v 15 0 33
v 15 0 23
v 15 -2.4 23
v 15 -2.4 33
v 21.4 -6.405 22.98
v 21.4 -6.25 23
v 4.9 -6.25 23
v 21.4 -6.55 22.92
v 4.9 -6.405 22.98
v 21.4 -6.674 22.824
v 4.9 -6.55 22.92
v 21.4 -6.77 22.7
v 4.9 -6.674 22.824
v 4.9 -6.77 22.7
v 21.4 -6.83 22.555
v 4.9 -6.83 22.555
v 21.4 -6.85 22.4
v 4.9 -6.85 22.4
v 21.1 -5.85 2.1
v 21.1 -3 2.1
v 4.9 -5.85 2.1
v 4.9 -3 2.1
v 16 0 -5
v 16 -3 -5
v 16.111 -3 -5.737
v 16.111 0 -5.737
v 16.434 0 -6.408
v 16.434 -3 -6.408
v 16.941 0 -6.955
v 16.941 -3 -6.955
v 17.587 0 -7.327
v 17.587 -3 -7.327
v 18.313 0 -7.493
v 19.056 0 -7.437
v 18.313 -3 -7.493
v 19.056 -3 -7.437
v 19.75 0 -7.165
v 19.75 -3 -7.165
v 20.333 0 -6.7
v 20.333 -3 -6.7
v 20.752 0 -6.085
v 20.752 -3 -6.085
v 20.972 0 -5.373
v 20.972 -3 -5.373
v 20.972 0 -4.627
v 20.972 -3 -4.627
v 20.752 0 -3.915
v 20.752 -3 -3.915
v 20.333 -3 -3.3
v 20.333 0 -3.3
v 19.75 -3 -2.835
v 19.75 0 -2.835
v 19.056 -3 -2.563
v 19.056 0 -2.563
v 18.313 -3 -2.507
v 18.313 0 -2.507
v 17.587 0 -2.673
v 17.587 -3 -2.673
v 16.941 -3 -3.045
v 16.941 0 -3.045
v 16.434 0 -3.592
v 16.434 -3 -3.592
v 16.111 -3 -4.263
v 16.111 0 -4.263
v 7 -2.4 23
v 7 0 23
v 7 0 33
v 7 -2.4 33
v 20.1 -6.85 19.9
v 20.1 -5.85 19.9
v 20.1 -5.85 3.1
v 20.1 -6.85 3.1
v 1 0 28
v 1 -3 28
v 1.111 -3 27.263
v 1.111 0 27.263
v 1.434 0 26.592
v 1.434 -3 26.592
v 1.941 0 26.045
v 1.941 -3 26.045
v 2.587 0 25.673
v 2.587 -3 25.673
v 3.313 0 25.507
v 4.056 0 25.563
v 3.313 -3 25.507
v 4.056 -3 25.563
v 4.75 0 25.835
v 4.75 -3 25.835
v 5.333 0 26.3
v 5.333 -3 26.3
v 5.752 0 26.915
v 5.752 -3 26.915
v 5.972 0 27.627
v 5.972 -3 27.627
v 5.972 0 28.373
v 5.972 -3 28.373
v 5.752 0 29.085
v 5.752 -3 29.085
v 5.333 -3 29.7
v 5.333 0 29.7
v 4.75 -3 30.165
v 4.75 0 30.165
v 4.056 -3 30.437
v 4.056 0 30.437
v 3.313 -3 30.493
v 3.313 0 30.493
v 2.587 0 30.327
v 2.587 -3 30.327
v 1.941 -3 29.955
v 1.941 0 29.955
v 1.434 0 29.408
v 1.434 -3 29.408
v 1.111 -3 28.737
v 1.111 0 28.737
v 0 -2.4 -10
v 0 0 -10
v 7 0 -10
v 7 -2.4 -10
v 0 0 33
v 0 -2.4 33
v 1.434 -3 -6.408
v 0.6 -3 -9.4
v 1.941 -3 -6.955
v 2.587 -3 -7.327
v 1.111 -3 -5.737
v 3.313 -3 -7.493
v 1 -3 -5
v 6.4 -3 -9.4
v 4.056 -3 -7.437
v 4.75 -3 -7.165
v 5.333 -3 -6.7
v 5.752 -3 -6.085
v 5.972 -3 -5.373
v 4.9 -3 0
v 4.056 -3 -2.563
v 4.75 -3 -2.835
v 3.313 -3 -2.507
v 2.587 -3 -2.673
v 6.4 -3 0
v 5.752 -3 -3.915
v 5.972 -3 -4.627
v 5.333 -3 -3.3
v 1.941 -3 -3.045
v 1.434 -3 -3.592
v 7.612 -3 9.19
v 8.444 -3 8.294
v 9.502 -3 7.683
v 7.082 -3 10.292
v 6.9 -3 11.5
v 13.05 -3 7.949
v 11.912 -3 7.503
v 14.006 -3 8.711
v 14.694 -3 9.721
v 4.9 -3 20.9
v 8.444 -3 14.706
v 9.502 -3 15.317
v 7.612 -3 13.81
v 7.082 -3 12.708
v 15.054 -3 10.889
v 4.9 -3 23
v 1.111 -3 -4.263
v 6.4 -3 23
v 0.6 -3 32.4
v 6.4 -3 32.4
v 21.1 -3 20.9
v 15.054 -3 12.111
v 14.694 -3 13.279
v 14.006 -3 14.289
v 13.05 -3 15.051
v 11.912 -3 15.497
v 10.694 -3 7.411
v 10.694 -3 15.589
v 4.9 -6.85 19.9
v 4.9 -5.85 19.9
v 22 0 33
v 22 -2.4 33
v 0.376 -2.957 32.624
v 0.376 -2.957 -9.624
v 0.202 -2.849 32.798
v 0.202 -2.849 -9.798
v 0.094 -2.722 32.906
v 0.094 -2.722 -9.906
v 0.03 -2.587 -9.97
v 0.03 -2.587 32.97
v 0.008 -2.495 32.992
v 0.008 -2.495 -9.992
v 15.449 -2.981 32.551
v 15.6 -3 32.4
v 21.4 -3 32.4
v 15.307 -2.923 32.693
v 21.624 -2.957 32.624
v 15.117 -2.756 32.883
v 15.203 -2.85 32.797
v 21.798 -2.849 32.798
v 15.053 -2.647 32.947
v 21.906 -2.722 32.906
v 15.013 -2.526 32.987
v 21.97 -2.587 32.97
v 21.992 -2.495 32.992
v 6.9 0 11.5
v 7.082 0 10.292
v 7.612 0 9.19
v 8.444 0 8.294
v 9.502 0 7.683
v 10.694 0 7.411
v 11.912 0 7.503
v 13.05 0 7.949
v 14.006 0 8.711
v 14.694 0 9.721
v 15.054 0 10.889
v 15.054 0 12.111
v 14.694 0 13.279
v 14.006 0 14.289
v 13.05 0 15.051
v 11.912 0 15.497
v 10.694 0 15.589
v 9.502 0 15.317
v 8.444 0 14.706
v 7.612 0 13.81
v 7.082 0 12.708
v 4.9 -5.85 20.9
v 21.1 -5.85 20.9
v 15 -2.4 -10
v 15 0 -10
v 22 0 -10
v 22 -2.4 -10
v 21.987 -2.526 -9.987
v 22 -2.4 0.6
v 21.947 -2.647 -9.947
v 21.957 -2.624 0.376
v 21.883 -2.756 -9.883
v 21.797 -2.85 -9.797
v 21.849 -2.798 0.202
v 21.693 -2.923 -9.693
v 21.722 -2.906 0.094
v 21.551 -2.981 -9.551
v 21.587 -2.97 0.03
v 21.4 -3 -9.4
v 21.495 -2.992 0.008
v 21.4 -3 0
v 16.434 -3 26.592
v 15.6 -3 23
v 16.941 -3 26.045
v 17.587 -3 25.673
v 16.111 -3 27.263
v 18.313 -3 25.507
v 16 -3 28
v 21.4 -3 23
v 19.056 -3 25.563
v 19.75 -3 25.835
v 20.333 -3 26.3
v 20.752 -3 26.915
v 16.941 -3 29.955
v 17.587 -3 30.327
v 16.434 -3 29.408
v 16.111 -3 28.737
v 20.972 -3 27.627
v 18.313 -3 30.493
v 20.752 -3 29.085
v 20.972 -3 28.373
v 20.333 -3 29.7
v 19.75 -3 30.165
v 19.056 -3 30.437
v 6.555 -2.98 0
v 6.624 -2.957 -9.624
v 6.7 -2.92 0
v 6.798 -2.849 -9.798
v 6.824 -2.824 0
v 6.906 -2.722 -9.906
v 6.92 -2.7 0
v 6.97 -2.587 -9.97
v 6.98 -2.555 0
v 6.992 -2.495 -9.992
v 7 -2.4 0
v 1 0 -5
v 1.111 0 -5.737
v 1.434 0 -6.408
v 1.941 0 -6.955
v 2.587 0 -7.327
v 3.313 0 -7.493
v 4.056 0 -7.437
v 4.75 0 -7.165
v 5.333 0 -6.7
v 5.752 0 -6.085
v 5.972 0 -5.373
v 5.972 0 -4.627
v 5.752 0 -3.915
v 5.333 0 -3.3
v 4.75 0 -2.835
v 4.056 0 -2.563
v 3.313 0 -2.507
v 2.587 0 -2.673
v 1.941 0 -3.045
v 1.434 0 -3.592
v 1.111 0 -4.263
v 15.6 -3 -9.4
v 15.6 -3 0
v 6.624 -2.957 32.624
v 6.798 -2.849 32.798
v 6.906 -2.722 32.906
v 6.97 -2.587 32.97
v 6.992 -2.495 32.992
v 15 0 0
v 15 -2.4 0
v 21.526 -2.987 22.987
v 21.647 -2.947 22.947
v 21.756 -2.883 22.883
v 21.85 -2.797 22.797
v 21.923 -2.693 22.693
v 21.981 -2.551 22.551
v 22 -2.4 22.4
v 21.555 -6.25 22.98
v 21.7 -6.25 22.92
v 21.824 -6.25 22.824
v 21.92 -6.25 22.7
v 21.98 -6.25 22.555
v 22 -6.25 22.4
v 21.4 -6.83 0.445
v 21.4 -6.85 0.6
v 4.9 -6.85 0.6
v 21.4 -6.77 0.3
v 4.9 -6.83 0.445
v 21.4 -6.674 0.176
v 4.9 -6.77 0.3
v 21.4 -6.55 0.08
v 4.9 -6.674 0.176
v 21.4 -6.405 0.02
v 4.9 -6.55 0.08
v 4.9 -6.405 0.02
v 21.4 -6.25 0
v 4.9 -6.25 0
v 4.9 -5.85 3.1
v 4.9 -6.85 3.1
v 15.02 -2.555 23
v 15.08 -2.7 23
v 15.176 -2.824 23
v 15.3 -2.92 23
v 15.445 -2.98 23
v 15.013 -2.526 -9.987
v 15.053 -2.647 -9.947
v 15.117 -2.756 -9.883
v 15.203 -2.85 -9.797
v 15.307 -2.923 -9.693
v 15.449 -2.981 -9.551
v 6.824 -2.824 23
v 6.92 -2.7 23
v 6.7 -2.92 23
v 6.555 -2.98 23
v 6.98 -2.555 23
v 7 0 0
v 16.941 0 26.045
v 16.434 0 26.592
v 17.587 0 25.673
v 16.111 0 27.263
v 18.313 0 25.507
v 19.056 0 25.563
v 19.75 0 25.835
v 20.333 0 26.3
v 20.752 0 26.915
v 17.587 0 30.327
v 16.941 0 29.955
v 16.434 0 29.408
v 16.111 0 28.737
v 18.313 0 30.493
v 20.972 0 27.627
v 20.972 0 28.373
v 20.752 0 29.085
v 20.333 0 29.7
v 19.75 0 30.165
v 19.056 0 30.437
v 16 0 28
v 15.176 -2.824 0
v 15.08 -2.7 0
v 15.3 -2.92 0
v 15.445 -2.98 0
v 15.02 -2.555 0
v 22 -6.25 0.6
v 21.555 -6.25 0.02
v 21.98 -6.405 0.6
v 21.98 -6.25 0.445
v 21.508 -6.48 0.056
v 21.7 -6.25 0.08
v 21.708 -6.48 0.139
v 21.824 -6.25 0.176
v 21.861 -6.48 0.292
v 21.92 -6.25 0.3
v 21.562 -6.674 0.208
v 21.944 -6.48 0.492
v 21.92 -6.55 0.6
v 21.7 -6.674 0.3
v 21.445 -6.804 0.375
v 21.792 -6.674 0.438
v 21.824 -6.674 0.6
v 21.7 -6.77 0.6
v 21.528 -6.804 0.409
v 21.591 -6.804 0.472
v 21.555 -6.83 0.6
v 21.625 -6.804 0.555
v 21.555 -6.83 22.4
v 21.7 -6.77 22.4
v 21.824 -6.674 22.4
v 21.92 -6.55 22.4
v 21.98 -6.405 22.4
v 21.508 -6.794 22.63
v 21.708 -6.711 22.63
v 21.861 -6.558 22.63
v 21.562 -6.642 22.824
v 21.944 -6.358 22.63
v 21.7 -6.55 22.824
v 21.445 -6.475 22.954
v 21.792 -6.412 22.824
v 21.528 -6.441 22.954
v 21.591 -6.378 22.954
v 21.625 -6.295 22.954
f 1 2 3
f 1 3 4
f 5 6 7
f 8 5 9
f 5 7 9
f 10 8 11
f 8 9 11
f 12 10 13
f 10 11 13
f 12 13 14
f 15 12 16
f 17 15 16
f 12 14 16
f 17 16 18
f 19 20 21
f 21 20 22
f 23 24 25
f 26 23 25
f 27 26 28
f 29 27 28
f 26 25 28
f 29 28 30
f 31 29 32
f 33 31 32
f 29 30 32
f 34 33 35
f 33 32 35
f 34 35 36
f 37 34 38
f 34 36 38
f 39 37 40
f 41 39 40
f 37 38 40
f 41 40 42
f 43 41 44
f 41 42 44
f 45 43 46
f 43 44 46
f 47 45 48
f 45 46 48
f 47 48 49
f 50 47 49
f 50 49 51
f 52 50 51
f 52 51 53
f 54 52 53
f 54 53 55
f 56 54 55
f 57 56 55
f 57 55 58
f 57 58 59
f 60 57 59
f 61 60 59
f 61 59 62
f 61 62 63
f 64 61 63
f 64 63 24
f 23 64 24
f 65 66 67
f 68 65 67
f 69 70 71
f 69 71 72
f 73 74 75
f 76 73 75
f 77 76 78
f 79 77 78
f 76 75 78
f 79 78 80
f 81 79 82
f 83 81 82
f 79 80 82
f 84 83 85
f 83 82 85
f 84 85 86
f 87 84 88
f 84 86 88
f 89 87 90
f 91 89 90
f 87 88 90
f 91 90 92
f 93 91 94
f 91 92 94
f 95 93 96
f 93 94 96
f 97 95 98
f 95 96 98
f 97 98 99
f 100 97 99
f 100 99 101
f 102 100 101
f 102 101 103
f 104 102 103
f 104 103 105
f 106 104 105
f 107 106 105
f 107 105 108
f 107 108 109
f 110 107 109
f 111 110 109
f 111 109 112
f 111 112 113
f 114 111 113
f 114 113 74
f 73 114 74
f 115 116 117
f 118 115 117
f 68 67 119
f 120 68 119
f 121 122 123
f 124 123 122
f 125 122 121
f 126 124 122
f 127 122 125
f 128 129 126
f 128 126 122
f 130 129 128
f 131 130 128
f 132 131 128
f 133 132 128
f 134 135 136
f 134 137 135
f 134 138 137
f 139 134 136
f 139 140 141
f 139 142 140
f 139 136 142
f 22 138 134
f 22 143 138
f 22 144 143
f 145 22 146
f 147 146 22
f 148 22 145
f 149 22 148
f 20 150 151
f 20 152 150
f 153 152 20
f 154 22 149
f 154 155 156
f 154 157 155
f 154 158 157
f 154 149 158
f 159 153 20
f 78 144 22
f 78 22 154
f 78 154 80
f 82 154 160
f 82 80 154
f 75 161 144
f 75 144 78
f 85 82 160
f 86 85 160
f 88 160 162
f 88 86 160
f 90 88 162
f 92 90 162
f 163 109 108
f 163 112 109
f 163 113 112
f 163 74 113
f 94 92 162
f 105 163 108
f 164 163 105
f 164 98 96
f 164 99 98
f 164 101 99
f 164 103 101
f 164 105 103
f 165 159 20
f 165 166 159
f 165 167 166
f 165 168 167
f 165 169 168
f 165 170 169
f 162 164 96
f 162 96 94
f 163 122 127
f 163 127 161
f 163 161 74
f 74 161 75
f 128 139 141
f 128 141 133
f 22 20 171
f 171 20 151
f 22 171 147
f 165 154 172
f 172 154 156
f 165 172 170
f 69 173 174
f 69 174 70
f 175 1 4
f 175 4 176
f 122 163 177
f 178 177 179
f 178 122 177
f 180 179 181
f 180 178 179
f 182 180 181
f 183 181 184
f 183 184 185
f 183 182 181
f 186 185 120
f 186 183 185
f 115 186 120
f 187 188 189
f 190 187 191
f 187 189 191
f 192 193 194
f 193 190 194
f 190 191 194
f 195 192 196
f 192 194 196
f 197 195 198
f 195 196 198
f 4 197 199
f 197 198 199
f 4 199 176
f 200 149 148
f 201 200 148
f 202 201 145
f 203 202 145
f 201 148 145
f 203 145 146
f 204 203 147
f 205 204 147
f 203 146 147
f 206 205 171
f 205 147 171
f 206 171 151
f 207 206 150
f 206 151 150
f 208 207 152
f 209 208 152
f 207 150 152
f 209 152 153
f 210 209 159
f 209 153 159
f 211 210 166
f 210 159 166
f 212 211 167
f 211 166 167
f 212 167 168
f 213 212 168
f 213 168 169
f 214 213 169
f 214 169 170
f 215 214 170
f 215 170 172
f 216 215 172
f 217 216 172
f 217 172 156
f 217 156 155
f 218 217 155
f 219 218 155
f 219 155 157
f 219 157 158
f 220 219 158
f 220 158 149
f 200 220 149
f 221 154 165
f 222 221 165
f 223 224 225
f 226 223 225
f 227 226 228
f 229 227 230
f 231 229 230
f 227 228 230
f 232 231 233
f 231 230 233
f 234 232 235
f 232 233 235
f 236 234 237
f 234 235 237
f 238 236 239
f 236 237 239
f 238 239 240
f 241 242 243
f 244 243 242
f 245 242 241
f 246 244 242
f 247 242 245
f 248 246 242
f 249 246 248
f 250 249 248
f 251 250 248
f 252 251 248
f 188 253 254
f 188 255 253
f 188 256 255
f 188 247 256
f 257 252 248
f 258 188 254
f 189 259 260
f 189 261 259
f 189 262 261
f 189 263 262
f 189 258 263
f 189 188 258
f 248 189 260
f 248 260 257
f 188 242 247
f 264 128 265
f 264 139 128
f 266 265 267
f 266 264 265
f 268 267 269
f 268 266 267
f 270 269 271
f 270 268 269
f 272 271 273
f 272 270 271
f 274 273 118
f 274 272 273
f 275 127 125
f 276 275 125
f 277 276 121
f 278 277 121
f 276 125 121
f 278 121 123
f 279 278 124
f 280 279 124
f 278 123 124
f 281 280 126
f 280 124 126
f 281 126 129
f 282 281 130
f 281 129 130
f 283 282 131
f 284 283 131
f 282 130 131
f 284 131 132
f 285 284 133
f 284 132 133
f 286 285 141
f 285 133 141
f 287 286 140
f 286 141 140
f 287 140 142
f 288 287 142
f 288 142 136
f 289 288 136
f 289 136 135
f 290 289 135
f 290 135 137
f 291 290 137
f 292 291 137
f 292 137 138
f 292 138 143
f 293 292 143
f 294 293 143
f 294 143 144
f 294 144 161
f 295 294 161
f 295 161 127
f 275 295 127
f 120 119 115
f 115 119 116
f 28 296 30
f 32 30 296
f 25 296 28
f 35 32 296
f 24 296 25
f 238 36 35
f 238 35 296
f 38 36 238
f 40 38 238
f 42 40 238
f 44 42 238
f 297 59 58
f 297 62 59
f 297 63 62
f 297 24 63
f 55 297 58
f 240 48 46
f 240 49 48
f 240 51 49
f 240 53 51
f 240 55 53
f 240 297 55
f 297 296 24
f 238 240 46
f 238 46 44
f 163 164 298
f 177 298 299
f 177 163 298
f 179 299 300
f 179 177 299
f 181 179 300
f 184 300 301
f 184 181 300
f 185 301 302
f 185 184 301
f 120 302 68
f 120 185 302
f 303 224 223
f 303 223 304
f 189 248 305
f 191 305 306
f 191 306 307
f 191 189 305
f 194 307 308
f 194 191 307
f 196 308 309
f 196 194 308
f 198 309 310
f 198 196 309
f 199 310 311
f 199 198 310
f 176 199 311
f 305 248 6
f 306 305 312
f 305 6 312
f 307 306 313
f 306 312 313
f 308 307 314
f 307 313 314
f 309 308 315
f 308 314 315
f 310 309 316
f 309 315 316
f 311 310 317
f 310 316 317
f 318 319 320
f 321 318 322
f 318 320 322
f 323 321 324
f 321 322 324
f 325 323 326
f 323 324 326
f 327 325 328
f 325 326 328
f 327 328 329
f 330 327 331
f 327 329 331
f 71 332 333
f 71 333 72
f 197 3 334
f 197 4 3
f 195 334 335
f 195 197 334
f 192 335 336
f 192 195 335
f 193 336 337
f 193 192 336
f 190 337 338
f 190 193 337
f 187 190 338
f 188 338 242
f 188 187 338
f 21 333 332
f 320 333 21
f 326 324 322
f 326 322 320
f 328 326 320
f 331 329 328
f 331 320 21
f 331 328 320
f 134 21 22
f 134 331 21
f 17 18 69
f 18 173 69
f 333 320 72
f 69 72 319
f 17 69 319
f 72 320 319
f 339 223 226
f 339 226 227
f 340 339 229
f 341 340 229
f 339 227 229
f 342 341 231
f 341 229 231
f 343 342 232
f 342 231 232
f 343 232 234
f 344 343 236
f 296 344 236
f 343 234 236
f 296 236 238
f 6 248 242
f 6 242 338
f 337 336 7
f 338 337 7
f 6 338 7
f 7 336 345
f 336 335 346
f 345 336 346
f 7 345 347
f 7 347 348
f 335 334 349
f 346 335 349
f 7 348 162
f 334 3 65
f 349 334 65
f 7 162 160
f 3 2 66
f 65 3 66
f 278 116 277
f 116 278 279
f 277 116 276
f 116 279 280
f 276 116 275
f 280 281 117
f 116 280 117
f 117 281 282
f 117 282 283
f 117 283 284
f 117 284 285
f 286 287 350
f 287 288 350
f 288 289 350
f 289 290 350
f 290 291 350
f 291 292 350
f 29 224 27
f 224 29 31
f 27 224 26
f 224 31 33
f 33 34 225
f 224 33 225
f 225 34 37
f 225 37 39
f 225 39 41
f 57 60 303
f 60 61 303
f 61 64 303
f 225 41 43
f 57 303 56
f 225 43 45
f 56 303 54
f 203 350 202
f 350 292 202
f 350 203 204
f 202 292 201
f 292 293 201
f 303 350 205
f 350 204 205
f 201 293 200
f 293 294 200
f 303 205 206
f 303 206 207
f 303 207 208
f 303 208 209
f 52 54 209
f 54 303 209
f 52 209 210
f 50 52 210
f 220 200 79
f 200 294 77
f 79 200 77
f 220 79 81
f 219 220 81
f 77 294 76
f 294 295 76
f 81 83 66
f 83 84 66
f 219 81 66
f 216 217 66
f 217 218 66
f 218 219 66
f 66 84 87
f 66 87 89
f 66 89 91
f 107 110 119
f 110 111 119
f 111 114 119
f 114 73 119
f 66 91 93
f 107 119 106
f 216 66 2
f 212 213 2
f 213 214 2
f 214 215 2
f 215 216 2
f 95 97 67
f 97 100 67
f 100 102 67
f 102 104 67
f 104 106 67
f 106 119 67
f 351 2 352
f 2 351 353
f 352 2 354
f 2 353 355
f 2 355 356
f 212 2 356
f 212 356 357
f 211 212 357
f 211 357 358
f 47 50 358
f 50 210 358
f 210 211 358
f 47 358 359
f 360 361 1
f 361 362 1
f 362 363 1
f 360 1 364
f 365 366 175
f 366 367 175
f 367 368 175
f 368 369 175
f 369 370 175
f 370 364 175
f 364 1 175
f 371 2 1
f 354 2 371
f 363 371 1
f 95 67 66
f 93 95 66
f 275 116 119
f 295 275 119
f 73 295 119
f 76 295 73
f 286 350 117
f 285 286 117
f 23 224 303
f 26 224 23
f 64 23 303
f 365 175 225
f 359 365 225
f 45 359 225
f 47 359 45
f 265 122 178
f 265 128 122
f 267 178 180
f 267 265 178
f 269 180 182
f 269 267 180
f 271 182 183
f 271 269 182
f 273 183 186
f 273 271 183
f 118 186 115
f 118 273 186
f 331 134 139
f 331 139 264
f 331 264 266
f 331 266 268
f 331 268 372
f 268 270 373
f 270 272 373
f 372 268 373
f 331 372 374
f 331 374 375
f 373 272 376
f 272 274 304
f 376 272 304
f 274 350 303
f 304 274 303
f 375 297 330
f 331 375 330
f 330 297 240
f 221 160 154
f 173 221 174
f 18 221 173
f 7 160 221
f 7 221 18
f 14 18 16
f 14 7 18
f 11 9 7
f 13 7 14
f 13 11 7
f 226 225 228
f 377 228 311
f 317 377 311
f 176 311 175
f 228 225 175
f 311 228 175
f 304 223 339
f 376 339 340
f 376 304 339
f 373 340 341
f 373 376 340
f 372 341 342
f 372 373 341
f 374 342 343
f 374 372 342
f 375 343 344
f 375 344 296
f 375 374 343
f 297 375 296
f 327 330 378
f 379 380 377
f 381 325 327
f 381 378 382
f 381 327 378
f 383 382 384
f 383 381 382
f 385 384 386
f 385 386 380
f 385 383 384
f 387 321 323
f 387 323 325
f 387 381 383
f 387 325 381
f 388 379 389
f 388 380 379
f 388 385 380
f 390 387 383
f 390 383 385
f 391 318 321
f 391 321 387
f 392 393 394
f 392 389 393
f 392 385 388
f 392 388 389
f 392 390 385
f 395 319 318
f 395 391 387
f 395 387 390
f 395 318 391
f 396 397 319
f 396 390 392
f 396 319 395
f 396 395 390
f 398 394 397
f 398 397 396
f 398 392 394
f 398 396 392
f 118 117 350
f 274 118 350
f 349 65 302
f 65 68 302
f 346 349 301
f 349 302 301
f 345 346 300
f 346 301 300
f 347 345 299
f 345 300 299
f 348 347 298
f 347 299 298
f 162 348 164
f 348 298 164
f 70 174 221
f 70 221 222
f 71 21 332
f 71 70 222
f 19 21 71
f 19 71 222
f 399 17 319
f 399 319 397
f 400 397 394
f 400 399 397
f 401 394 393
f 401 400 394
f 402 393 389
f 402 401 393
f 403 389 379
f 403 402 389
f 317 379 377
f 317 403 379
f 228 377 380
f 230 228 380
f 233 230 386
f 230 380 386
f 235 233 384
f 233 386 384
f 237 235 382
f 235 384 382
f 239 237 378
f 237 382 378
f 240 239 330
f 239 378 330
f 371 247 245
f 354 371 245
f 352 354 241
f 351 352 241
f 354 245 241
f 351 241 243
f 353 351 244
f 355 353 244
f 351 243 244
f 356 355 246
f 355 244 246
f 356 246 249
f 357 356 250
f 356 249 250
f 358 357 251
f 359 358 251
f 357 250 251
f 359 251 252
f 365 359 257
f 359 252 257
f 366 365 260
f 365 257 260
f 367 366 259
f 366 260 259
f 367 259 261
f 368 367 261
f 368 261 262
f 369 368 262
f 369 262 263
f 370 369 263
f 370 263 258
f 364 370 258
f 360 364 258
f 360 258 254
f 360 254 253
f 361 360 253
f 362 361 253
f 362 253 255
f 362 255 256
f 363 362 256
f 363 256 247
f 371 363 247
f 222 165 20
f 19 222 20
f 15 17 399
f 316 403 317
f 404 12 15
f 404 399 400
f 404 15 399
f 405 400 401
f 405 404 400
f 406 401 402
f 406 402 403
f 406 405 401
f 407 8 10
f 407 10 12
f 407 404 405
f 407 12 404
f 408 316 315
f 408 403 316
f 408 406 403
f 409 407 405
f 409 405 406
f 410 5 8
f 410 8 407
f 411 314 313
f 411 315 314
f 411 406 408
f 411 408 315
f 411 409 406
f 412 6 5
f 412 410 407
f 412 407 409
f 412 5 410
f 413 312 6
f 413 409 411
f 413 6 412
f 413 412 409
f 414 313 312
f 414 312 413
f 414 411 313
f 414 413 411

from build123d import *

# Parameters (mm, degrees)
F1_DEPTH      = 3
F2_DEPTH      = 6.85
F6_DEPTH      = 3
F3_W          = 16.2
F3_H          = 1
F7_DEPTH      = 1
F5_W          = 16.2
F5_H          = 1
F8_DEPTH      = 1
F4_W          = 1
F4_H          = 18.8
F9_DEPTH      = 1
F0_W          = 7
F0_H          = 10
F10_DEPTH     = 3
F11_D         = 8.2
F12_D         = 5
F13_R         = 0.6
F14_R         = 0.6
F15_T1_DEPTH  = 18
F15_S5_W      = 0.6
F15_S5_H      = 0.6
F15_T6_DEPTH  = 0.6
F15_S11_W     = 0.6
F15_S11_H     = 0.6
F15_T12_DEPTH = 0.6


# Not quite as in the source:
# - a fillet or chamfer that OpenCascade refuses, or shapes differently, is made with other operations: its cross-section is extruded or revolved along the edge and cut away or added
# - a feature names something its author has since deleted; it is built from what else it names


with BuildPart() as f1:
    # F0 (on Front) → F1 (new body)
    with BuildSketch(Plane.XZ):
        Polygon((0.9, 2.1), (4.9, 2.1), (21.1, 2.1), (21.1, 20.9), (4.9, 20.9), (0.9, 20.9), align=None)
        Polygon((4.9, 2.1), (4.9, 0), (7, 0), (15, 0), (22, 0), (22, 23), (15, 23), (7, 23), (4.9, 23), (4.9, 20.9), (21.1, 20.9), (21.1, 2.1), align=None)
    extrude(amount=F1_DEPTH)

    # F0 (on Front) → F2 (join)
    with BuildSketch(Plane.XZ):
        Polygon((4.9, 2.1), (4.9, 0), (7, 0), (15, 0), (22, 0), (22, 23), (15, 23), (7, 23), (4.9, 23), (4.9, 20.9), (21.1, 20.9), (21.1, 2.1), align=None)
    extrude(amount=F2_DEPTH)

    # F0 (on Front) → F6 (join)
    with BuildSketch(Plane.XZ):
        Polygon((0, 23), (0, 0), (4.9, 0), (4.9, 2.1), (0.9, 2.1), (0.9, 20.9), (4.9, 20.9), (4.9, 23), align=None)
    extrude(amount=F6_DEPTH)

    # F3 (on face) → F7 (join)
    with BuildSketch(Plane(origin=(0, 0, 20.9), x_dir=(1, 0, 0), z_dir=(0, 0, -1))):
        with Locations((13, 6.35)):
            Rectangle(F3_W, F3_H)
    extrude(amount=F7_DEPTH)

    # F5 (on face) → F8 (join)
    with BuildSketch(Plane.XY.offset(2.1)):
        with Locations((13, -6.35)):
            Rectangle(F5_W, F5_H)
    extrude(amount=F8_DEPTH)

    # F4 (on face) → F9 (join)
    with BuildSketch(Plane(origin=(21.1, 0, 0), x_dir=(0, -1, 0), z_dir=(-1, 0, 0))):
        with Locations((6.35, 11.5)):
            Rectangle(F4_W, F4_H)
    extrude(amount=F9_DEPTH)

    # F0 (on Front) → F10 (join)
    with BuildSketch(Plane.XZ):
        with Locations((18.5, 28)):
            Rectangle(F0_W, F0_H)
        with Locations((18.5, -5)):
            Rectangle(F0_W, F0_H)
        Polygon((0, 33), (0, 23), (4.9, 23), (7, 23), (7, 33), align=None)
        Polygon((4.9, 0), (0, 0), (0, -10), (7, -10), (7, 0), align=None)
    extrude(amount=F10_DEPTH)

    # F11 (through all)
    with Locations(Plane(origin=(0, 0, 0), x_dir=(1, 0, 0), z_dir=(0, 1, 0))):
        with Locations((11, -11.5)):
            Hole(F11_D / 2)

    # F12 (through all)
    with Locations(Plane(origin=(0, 0, 0), x_dir=(1, 0, 0), z_dir=(0, 1, 0))):
        with Locations((3.5, -28), (18.5, -28), (3.5, 5), (18.5, 5)):
            Hole(F12_D / 2)

    # F13
    f13_edges = [f1.edges().sort_by_distance(p)[0] for p in [
        (0, -3, 11.5),
        (3.5, -3, -10),
        (7, -3, -5),
        (3.5, -3, 33),
        (7, -3, 28),
    ]]
    fillet(f13_edges, radius=F13_R)

    # F14
    f14_edges = [f1.edges().sort_by_distance(p)[0] for p in [
        (22, -3, -5),
        (18.5, -3, -10),
        (15, -3, -5),
        (22, -4.925, 0),
        (22, -6.85, 11.5),
        (22, -4.925, 23),
        (22, -3, 28),
        (15, -3, 28),
        (18.5, -3, 33),
    ]]
    fillet(f14_edges, radius=F14_R)

    # F15: fillet of radius 0.6 on 2 edges, made by hand

    # F15_s2 → F15_t1 (cut)
    with BuildSketch(Plane.YZ.offset(3.4)):
        with BuildLine():
            ThreePointArc((-6.25, 23), (-6.6742640687, 22.8242640687), (-6.85, 22.4))
            Line((-6.85, 22.4), (-6.85, 23))
            Line((-6.85, 23), (-6.25, 23))
        make_face()
        with BuildLine():
            ThreePointArc((-6.85, 0.6), (-6.6742640687, 0.1757359313), (-6.25, 0))
            Line((-6.25, 0), (-6.85, 0))
            Line((-6.85, 0), (-6.85, 0.6))
        make_face()
    extrude(amount=F15_T1_DEPTH, mode=Mode.SUBTRACT)


with BuildPart() as f15_tool4:
    # F15_s5 → F15_t6 (new body)
    with BuildSketch(Plane.XZ.offset(6.25)):
        with Locations((21.7, 0.3)):
            Rectangle(F15_S5_W, F15_S5_H)
    extrude(amount=F15_T6_DEPTH)

    # F15_s7 → F15_t8 (revolve, cut)
    with BuildSketch(Plane(origin=(21.4, -6.25, 0.6), x_dir=(-0.7071067812, 0, 0.7071067812), z_dir=(0.7071067812, 0, 0.7071067812))):
        with BuildLine():
            ThreePointArc((0, -0.6), (0.6, 0), (0, 0.6))
            Line((0, 0.6), (0, -0.6))
        make_face()
    revolve(axis=Axis((21.4, -6.25, 0.6), (0, -1, 0)), mode=Mode.SUBTRACT)


with BuildPart() as f1_1:
    add(f1.part)

    # F15_t3: cut F15_tool4
    add(f15_tool4.part, mode=Mode.SUBTRACT)


with BuildPart() as f15_tool10:
    # F15_s11 → F15_t12 (new body)
    with BuildSketch(Plane.XY.offset(22.4)):
        with Locations((21.7, -6.55)):
            Rectangle(F15_S11_W, F15_S11_H)
    extrude(amount=F15_T12_DEPTH)

    # F15_s13 → F15_t14 (revolve, cut)
    with BuildSketch(Plane(origin=(21.4, -6.25, 22.4), x_dir=(-0.7071067812, 0.7071067812, 0), z_dir=(0.7071067812, 0.7071067812, 0))):
        with BuildLine():
            ThreePointArc((0, -0.6), (0.6, 0), (0, 0.6))
            Line((0, 0.6), (0, -0.6))
        make_face()
    revolve(axis=Axis((21.4, -6.25, 22.4), (0, 0, 1)), mode=Mode.SUBTRACT)


with BuildPart() as f1_2:
    add(f1_1.part)

    # F15_t9: cut F15_tool10
    add(f15_tool10.part, mode=Mode.SUBTRACT)


solid = f1_2.part
